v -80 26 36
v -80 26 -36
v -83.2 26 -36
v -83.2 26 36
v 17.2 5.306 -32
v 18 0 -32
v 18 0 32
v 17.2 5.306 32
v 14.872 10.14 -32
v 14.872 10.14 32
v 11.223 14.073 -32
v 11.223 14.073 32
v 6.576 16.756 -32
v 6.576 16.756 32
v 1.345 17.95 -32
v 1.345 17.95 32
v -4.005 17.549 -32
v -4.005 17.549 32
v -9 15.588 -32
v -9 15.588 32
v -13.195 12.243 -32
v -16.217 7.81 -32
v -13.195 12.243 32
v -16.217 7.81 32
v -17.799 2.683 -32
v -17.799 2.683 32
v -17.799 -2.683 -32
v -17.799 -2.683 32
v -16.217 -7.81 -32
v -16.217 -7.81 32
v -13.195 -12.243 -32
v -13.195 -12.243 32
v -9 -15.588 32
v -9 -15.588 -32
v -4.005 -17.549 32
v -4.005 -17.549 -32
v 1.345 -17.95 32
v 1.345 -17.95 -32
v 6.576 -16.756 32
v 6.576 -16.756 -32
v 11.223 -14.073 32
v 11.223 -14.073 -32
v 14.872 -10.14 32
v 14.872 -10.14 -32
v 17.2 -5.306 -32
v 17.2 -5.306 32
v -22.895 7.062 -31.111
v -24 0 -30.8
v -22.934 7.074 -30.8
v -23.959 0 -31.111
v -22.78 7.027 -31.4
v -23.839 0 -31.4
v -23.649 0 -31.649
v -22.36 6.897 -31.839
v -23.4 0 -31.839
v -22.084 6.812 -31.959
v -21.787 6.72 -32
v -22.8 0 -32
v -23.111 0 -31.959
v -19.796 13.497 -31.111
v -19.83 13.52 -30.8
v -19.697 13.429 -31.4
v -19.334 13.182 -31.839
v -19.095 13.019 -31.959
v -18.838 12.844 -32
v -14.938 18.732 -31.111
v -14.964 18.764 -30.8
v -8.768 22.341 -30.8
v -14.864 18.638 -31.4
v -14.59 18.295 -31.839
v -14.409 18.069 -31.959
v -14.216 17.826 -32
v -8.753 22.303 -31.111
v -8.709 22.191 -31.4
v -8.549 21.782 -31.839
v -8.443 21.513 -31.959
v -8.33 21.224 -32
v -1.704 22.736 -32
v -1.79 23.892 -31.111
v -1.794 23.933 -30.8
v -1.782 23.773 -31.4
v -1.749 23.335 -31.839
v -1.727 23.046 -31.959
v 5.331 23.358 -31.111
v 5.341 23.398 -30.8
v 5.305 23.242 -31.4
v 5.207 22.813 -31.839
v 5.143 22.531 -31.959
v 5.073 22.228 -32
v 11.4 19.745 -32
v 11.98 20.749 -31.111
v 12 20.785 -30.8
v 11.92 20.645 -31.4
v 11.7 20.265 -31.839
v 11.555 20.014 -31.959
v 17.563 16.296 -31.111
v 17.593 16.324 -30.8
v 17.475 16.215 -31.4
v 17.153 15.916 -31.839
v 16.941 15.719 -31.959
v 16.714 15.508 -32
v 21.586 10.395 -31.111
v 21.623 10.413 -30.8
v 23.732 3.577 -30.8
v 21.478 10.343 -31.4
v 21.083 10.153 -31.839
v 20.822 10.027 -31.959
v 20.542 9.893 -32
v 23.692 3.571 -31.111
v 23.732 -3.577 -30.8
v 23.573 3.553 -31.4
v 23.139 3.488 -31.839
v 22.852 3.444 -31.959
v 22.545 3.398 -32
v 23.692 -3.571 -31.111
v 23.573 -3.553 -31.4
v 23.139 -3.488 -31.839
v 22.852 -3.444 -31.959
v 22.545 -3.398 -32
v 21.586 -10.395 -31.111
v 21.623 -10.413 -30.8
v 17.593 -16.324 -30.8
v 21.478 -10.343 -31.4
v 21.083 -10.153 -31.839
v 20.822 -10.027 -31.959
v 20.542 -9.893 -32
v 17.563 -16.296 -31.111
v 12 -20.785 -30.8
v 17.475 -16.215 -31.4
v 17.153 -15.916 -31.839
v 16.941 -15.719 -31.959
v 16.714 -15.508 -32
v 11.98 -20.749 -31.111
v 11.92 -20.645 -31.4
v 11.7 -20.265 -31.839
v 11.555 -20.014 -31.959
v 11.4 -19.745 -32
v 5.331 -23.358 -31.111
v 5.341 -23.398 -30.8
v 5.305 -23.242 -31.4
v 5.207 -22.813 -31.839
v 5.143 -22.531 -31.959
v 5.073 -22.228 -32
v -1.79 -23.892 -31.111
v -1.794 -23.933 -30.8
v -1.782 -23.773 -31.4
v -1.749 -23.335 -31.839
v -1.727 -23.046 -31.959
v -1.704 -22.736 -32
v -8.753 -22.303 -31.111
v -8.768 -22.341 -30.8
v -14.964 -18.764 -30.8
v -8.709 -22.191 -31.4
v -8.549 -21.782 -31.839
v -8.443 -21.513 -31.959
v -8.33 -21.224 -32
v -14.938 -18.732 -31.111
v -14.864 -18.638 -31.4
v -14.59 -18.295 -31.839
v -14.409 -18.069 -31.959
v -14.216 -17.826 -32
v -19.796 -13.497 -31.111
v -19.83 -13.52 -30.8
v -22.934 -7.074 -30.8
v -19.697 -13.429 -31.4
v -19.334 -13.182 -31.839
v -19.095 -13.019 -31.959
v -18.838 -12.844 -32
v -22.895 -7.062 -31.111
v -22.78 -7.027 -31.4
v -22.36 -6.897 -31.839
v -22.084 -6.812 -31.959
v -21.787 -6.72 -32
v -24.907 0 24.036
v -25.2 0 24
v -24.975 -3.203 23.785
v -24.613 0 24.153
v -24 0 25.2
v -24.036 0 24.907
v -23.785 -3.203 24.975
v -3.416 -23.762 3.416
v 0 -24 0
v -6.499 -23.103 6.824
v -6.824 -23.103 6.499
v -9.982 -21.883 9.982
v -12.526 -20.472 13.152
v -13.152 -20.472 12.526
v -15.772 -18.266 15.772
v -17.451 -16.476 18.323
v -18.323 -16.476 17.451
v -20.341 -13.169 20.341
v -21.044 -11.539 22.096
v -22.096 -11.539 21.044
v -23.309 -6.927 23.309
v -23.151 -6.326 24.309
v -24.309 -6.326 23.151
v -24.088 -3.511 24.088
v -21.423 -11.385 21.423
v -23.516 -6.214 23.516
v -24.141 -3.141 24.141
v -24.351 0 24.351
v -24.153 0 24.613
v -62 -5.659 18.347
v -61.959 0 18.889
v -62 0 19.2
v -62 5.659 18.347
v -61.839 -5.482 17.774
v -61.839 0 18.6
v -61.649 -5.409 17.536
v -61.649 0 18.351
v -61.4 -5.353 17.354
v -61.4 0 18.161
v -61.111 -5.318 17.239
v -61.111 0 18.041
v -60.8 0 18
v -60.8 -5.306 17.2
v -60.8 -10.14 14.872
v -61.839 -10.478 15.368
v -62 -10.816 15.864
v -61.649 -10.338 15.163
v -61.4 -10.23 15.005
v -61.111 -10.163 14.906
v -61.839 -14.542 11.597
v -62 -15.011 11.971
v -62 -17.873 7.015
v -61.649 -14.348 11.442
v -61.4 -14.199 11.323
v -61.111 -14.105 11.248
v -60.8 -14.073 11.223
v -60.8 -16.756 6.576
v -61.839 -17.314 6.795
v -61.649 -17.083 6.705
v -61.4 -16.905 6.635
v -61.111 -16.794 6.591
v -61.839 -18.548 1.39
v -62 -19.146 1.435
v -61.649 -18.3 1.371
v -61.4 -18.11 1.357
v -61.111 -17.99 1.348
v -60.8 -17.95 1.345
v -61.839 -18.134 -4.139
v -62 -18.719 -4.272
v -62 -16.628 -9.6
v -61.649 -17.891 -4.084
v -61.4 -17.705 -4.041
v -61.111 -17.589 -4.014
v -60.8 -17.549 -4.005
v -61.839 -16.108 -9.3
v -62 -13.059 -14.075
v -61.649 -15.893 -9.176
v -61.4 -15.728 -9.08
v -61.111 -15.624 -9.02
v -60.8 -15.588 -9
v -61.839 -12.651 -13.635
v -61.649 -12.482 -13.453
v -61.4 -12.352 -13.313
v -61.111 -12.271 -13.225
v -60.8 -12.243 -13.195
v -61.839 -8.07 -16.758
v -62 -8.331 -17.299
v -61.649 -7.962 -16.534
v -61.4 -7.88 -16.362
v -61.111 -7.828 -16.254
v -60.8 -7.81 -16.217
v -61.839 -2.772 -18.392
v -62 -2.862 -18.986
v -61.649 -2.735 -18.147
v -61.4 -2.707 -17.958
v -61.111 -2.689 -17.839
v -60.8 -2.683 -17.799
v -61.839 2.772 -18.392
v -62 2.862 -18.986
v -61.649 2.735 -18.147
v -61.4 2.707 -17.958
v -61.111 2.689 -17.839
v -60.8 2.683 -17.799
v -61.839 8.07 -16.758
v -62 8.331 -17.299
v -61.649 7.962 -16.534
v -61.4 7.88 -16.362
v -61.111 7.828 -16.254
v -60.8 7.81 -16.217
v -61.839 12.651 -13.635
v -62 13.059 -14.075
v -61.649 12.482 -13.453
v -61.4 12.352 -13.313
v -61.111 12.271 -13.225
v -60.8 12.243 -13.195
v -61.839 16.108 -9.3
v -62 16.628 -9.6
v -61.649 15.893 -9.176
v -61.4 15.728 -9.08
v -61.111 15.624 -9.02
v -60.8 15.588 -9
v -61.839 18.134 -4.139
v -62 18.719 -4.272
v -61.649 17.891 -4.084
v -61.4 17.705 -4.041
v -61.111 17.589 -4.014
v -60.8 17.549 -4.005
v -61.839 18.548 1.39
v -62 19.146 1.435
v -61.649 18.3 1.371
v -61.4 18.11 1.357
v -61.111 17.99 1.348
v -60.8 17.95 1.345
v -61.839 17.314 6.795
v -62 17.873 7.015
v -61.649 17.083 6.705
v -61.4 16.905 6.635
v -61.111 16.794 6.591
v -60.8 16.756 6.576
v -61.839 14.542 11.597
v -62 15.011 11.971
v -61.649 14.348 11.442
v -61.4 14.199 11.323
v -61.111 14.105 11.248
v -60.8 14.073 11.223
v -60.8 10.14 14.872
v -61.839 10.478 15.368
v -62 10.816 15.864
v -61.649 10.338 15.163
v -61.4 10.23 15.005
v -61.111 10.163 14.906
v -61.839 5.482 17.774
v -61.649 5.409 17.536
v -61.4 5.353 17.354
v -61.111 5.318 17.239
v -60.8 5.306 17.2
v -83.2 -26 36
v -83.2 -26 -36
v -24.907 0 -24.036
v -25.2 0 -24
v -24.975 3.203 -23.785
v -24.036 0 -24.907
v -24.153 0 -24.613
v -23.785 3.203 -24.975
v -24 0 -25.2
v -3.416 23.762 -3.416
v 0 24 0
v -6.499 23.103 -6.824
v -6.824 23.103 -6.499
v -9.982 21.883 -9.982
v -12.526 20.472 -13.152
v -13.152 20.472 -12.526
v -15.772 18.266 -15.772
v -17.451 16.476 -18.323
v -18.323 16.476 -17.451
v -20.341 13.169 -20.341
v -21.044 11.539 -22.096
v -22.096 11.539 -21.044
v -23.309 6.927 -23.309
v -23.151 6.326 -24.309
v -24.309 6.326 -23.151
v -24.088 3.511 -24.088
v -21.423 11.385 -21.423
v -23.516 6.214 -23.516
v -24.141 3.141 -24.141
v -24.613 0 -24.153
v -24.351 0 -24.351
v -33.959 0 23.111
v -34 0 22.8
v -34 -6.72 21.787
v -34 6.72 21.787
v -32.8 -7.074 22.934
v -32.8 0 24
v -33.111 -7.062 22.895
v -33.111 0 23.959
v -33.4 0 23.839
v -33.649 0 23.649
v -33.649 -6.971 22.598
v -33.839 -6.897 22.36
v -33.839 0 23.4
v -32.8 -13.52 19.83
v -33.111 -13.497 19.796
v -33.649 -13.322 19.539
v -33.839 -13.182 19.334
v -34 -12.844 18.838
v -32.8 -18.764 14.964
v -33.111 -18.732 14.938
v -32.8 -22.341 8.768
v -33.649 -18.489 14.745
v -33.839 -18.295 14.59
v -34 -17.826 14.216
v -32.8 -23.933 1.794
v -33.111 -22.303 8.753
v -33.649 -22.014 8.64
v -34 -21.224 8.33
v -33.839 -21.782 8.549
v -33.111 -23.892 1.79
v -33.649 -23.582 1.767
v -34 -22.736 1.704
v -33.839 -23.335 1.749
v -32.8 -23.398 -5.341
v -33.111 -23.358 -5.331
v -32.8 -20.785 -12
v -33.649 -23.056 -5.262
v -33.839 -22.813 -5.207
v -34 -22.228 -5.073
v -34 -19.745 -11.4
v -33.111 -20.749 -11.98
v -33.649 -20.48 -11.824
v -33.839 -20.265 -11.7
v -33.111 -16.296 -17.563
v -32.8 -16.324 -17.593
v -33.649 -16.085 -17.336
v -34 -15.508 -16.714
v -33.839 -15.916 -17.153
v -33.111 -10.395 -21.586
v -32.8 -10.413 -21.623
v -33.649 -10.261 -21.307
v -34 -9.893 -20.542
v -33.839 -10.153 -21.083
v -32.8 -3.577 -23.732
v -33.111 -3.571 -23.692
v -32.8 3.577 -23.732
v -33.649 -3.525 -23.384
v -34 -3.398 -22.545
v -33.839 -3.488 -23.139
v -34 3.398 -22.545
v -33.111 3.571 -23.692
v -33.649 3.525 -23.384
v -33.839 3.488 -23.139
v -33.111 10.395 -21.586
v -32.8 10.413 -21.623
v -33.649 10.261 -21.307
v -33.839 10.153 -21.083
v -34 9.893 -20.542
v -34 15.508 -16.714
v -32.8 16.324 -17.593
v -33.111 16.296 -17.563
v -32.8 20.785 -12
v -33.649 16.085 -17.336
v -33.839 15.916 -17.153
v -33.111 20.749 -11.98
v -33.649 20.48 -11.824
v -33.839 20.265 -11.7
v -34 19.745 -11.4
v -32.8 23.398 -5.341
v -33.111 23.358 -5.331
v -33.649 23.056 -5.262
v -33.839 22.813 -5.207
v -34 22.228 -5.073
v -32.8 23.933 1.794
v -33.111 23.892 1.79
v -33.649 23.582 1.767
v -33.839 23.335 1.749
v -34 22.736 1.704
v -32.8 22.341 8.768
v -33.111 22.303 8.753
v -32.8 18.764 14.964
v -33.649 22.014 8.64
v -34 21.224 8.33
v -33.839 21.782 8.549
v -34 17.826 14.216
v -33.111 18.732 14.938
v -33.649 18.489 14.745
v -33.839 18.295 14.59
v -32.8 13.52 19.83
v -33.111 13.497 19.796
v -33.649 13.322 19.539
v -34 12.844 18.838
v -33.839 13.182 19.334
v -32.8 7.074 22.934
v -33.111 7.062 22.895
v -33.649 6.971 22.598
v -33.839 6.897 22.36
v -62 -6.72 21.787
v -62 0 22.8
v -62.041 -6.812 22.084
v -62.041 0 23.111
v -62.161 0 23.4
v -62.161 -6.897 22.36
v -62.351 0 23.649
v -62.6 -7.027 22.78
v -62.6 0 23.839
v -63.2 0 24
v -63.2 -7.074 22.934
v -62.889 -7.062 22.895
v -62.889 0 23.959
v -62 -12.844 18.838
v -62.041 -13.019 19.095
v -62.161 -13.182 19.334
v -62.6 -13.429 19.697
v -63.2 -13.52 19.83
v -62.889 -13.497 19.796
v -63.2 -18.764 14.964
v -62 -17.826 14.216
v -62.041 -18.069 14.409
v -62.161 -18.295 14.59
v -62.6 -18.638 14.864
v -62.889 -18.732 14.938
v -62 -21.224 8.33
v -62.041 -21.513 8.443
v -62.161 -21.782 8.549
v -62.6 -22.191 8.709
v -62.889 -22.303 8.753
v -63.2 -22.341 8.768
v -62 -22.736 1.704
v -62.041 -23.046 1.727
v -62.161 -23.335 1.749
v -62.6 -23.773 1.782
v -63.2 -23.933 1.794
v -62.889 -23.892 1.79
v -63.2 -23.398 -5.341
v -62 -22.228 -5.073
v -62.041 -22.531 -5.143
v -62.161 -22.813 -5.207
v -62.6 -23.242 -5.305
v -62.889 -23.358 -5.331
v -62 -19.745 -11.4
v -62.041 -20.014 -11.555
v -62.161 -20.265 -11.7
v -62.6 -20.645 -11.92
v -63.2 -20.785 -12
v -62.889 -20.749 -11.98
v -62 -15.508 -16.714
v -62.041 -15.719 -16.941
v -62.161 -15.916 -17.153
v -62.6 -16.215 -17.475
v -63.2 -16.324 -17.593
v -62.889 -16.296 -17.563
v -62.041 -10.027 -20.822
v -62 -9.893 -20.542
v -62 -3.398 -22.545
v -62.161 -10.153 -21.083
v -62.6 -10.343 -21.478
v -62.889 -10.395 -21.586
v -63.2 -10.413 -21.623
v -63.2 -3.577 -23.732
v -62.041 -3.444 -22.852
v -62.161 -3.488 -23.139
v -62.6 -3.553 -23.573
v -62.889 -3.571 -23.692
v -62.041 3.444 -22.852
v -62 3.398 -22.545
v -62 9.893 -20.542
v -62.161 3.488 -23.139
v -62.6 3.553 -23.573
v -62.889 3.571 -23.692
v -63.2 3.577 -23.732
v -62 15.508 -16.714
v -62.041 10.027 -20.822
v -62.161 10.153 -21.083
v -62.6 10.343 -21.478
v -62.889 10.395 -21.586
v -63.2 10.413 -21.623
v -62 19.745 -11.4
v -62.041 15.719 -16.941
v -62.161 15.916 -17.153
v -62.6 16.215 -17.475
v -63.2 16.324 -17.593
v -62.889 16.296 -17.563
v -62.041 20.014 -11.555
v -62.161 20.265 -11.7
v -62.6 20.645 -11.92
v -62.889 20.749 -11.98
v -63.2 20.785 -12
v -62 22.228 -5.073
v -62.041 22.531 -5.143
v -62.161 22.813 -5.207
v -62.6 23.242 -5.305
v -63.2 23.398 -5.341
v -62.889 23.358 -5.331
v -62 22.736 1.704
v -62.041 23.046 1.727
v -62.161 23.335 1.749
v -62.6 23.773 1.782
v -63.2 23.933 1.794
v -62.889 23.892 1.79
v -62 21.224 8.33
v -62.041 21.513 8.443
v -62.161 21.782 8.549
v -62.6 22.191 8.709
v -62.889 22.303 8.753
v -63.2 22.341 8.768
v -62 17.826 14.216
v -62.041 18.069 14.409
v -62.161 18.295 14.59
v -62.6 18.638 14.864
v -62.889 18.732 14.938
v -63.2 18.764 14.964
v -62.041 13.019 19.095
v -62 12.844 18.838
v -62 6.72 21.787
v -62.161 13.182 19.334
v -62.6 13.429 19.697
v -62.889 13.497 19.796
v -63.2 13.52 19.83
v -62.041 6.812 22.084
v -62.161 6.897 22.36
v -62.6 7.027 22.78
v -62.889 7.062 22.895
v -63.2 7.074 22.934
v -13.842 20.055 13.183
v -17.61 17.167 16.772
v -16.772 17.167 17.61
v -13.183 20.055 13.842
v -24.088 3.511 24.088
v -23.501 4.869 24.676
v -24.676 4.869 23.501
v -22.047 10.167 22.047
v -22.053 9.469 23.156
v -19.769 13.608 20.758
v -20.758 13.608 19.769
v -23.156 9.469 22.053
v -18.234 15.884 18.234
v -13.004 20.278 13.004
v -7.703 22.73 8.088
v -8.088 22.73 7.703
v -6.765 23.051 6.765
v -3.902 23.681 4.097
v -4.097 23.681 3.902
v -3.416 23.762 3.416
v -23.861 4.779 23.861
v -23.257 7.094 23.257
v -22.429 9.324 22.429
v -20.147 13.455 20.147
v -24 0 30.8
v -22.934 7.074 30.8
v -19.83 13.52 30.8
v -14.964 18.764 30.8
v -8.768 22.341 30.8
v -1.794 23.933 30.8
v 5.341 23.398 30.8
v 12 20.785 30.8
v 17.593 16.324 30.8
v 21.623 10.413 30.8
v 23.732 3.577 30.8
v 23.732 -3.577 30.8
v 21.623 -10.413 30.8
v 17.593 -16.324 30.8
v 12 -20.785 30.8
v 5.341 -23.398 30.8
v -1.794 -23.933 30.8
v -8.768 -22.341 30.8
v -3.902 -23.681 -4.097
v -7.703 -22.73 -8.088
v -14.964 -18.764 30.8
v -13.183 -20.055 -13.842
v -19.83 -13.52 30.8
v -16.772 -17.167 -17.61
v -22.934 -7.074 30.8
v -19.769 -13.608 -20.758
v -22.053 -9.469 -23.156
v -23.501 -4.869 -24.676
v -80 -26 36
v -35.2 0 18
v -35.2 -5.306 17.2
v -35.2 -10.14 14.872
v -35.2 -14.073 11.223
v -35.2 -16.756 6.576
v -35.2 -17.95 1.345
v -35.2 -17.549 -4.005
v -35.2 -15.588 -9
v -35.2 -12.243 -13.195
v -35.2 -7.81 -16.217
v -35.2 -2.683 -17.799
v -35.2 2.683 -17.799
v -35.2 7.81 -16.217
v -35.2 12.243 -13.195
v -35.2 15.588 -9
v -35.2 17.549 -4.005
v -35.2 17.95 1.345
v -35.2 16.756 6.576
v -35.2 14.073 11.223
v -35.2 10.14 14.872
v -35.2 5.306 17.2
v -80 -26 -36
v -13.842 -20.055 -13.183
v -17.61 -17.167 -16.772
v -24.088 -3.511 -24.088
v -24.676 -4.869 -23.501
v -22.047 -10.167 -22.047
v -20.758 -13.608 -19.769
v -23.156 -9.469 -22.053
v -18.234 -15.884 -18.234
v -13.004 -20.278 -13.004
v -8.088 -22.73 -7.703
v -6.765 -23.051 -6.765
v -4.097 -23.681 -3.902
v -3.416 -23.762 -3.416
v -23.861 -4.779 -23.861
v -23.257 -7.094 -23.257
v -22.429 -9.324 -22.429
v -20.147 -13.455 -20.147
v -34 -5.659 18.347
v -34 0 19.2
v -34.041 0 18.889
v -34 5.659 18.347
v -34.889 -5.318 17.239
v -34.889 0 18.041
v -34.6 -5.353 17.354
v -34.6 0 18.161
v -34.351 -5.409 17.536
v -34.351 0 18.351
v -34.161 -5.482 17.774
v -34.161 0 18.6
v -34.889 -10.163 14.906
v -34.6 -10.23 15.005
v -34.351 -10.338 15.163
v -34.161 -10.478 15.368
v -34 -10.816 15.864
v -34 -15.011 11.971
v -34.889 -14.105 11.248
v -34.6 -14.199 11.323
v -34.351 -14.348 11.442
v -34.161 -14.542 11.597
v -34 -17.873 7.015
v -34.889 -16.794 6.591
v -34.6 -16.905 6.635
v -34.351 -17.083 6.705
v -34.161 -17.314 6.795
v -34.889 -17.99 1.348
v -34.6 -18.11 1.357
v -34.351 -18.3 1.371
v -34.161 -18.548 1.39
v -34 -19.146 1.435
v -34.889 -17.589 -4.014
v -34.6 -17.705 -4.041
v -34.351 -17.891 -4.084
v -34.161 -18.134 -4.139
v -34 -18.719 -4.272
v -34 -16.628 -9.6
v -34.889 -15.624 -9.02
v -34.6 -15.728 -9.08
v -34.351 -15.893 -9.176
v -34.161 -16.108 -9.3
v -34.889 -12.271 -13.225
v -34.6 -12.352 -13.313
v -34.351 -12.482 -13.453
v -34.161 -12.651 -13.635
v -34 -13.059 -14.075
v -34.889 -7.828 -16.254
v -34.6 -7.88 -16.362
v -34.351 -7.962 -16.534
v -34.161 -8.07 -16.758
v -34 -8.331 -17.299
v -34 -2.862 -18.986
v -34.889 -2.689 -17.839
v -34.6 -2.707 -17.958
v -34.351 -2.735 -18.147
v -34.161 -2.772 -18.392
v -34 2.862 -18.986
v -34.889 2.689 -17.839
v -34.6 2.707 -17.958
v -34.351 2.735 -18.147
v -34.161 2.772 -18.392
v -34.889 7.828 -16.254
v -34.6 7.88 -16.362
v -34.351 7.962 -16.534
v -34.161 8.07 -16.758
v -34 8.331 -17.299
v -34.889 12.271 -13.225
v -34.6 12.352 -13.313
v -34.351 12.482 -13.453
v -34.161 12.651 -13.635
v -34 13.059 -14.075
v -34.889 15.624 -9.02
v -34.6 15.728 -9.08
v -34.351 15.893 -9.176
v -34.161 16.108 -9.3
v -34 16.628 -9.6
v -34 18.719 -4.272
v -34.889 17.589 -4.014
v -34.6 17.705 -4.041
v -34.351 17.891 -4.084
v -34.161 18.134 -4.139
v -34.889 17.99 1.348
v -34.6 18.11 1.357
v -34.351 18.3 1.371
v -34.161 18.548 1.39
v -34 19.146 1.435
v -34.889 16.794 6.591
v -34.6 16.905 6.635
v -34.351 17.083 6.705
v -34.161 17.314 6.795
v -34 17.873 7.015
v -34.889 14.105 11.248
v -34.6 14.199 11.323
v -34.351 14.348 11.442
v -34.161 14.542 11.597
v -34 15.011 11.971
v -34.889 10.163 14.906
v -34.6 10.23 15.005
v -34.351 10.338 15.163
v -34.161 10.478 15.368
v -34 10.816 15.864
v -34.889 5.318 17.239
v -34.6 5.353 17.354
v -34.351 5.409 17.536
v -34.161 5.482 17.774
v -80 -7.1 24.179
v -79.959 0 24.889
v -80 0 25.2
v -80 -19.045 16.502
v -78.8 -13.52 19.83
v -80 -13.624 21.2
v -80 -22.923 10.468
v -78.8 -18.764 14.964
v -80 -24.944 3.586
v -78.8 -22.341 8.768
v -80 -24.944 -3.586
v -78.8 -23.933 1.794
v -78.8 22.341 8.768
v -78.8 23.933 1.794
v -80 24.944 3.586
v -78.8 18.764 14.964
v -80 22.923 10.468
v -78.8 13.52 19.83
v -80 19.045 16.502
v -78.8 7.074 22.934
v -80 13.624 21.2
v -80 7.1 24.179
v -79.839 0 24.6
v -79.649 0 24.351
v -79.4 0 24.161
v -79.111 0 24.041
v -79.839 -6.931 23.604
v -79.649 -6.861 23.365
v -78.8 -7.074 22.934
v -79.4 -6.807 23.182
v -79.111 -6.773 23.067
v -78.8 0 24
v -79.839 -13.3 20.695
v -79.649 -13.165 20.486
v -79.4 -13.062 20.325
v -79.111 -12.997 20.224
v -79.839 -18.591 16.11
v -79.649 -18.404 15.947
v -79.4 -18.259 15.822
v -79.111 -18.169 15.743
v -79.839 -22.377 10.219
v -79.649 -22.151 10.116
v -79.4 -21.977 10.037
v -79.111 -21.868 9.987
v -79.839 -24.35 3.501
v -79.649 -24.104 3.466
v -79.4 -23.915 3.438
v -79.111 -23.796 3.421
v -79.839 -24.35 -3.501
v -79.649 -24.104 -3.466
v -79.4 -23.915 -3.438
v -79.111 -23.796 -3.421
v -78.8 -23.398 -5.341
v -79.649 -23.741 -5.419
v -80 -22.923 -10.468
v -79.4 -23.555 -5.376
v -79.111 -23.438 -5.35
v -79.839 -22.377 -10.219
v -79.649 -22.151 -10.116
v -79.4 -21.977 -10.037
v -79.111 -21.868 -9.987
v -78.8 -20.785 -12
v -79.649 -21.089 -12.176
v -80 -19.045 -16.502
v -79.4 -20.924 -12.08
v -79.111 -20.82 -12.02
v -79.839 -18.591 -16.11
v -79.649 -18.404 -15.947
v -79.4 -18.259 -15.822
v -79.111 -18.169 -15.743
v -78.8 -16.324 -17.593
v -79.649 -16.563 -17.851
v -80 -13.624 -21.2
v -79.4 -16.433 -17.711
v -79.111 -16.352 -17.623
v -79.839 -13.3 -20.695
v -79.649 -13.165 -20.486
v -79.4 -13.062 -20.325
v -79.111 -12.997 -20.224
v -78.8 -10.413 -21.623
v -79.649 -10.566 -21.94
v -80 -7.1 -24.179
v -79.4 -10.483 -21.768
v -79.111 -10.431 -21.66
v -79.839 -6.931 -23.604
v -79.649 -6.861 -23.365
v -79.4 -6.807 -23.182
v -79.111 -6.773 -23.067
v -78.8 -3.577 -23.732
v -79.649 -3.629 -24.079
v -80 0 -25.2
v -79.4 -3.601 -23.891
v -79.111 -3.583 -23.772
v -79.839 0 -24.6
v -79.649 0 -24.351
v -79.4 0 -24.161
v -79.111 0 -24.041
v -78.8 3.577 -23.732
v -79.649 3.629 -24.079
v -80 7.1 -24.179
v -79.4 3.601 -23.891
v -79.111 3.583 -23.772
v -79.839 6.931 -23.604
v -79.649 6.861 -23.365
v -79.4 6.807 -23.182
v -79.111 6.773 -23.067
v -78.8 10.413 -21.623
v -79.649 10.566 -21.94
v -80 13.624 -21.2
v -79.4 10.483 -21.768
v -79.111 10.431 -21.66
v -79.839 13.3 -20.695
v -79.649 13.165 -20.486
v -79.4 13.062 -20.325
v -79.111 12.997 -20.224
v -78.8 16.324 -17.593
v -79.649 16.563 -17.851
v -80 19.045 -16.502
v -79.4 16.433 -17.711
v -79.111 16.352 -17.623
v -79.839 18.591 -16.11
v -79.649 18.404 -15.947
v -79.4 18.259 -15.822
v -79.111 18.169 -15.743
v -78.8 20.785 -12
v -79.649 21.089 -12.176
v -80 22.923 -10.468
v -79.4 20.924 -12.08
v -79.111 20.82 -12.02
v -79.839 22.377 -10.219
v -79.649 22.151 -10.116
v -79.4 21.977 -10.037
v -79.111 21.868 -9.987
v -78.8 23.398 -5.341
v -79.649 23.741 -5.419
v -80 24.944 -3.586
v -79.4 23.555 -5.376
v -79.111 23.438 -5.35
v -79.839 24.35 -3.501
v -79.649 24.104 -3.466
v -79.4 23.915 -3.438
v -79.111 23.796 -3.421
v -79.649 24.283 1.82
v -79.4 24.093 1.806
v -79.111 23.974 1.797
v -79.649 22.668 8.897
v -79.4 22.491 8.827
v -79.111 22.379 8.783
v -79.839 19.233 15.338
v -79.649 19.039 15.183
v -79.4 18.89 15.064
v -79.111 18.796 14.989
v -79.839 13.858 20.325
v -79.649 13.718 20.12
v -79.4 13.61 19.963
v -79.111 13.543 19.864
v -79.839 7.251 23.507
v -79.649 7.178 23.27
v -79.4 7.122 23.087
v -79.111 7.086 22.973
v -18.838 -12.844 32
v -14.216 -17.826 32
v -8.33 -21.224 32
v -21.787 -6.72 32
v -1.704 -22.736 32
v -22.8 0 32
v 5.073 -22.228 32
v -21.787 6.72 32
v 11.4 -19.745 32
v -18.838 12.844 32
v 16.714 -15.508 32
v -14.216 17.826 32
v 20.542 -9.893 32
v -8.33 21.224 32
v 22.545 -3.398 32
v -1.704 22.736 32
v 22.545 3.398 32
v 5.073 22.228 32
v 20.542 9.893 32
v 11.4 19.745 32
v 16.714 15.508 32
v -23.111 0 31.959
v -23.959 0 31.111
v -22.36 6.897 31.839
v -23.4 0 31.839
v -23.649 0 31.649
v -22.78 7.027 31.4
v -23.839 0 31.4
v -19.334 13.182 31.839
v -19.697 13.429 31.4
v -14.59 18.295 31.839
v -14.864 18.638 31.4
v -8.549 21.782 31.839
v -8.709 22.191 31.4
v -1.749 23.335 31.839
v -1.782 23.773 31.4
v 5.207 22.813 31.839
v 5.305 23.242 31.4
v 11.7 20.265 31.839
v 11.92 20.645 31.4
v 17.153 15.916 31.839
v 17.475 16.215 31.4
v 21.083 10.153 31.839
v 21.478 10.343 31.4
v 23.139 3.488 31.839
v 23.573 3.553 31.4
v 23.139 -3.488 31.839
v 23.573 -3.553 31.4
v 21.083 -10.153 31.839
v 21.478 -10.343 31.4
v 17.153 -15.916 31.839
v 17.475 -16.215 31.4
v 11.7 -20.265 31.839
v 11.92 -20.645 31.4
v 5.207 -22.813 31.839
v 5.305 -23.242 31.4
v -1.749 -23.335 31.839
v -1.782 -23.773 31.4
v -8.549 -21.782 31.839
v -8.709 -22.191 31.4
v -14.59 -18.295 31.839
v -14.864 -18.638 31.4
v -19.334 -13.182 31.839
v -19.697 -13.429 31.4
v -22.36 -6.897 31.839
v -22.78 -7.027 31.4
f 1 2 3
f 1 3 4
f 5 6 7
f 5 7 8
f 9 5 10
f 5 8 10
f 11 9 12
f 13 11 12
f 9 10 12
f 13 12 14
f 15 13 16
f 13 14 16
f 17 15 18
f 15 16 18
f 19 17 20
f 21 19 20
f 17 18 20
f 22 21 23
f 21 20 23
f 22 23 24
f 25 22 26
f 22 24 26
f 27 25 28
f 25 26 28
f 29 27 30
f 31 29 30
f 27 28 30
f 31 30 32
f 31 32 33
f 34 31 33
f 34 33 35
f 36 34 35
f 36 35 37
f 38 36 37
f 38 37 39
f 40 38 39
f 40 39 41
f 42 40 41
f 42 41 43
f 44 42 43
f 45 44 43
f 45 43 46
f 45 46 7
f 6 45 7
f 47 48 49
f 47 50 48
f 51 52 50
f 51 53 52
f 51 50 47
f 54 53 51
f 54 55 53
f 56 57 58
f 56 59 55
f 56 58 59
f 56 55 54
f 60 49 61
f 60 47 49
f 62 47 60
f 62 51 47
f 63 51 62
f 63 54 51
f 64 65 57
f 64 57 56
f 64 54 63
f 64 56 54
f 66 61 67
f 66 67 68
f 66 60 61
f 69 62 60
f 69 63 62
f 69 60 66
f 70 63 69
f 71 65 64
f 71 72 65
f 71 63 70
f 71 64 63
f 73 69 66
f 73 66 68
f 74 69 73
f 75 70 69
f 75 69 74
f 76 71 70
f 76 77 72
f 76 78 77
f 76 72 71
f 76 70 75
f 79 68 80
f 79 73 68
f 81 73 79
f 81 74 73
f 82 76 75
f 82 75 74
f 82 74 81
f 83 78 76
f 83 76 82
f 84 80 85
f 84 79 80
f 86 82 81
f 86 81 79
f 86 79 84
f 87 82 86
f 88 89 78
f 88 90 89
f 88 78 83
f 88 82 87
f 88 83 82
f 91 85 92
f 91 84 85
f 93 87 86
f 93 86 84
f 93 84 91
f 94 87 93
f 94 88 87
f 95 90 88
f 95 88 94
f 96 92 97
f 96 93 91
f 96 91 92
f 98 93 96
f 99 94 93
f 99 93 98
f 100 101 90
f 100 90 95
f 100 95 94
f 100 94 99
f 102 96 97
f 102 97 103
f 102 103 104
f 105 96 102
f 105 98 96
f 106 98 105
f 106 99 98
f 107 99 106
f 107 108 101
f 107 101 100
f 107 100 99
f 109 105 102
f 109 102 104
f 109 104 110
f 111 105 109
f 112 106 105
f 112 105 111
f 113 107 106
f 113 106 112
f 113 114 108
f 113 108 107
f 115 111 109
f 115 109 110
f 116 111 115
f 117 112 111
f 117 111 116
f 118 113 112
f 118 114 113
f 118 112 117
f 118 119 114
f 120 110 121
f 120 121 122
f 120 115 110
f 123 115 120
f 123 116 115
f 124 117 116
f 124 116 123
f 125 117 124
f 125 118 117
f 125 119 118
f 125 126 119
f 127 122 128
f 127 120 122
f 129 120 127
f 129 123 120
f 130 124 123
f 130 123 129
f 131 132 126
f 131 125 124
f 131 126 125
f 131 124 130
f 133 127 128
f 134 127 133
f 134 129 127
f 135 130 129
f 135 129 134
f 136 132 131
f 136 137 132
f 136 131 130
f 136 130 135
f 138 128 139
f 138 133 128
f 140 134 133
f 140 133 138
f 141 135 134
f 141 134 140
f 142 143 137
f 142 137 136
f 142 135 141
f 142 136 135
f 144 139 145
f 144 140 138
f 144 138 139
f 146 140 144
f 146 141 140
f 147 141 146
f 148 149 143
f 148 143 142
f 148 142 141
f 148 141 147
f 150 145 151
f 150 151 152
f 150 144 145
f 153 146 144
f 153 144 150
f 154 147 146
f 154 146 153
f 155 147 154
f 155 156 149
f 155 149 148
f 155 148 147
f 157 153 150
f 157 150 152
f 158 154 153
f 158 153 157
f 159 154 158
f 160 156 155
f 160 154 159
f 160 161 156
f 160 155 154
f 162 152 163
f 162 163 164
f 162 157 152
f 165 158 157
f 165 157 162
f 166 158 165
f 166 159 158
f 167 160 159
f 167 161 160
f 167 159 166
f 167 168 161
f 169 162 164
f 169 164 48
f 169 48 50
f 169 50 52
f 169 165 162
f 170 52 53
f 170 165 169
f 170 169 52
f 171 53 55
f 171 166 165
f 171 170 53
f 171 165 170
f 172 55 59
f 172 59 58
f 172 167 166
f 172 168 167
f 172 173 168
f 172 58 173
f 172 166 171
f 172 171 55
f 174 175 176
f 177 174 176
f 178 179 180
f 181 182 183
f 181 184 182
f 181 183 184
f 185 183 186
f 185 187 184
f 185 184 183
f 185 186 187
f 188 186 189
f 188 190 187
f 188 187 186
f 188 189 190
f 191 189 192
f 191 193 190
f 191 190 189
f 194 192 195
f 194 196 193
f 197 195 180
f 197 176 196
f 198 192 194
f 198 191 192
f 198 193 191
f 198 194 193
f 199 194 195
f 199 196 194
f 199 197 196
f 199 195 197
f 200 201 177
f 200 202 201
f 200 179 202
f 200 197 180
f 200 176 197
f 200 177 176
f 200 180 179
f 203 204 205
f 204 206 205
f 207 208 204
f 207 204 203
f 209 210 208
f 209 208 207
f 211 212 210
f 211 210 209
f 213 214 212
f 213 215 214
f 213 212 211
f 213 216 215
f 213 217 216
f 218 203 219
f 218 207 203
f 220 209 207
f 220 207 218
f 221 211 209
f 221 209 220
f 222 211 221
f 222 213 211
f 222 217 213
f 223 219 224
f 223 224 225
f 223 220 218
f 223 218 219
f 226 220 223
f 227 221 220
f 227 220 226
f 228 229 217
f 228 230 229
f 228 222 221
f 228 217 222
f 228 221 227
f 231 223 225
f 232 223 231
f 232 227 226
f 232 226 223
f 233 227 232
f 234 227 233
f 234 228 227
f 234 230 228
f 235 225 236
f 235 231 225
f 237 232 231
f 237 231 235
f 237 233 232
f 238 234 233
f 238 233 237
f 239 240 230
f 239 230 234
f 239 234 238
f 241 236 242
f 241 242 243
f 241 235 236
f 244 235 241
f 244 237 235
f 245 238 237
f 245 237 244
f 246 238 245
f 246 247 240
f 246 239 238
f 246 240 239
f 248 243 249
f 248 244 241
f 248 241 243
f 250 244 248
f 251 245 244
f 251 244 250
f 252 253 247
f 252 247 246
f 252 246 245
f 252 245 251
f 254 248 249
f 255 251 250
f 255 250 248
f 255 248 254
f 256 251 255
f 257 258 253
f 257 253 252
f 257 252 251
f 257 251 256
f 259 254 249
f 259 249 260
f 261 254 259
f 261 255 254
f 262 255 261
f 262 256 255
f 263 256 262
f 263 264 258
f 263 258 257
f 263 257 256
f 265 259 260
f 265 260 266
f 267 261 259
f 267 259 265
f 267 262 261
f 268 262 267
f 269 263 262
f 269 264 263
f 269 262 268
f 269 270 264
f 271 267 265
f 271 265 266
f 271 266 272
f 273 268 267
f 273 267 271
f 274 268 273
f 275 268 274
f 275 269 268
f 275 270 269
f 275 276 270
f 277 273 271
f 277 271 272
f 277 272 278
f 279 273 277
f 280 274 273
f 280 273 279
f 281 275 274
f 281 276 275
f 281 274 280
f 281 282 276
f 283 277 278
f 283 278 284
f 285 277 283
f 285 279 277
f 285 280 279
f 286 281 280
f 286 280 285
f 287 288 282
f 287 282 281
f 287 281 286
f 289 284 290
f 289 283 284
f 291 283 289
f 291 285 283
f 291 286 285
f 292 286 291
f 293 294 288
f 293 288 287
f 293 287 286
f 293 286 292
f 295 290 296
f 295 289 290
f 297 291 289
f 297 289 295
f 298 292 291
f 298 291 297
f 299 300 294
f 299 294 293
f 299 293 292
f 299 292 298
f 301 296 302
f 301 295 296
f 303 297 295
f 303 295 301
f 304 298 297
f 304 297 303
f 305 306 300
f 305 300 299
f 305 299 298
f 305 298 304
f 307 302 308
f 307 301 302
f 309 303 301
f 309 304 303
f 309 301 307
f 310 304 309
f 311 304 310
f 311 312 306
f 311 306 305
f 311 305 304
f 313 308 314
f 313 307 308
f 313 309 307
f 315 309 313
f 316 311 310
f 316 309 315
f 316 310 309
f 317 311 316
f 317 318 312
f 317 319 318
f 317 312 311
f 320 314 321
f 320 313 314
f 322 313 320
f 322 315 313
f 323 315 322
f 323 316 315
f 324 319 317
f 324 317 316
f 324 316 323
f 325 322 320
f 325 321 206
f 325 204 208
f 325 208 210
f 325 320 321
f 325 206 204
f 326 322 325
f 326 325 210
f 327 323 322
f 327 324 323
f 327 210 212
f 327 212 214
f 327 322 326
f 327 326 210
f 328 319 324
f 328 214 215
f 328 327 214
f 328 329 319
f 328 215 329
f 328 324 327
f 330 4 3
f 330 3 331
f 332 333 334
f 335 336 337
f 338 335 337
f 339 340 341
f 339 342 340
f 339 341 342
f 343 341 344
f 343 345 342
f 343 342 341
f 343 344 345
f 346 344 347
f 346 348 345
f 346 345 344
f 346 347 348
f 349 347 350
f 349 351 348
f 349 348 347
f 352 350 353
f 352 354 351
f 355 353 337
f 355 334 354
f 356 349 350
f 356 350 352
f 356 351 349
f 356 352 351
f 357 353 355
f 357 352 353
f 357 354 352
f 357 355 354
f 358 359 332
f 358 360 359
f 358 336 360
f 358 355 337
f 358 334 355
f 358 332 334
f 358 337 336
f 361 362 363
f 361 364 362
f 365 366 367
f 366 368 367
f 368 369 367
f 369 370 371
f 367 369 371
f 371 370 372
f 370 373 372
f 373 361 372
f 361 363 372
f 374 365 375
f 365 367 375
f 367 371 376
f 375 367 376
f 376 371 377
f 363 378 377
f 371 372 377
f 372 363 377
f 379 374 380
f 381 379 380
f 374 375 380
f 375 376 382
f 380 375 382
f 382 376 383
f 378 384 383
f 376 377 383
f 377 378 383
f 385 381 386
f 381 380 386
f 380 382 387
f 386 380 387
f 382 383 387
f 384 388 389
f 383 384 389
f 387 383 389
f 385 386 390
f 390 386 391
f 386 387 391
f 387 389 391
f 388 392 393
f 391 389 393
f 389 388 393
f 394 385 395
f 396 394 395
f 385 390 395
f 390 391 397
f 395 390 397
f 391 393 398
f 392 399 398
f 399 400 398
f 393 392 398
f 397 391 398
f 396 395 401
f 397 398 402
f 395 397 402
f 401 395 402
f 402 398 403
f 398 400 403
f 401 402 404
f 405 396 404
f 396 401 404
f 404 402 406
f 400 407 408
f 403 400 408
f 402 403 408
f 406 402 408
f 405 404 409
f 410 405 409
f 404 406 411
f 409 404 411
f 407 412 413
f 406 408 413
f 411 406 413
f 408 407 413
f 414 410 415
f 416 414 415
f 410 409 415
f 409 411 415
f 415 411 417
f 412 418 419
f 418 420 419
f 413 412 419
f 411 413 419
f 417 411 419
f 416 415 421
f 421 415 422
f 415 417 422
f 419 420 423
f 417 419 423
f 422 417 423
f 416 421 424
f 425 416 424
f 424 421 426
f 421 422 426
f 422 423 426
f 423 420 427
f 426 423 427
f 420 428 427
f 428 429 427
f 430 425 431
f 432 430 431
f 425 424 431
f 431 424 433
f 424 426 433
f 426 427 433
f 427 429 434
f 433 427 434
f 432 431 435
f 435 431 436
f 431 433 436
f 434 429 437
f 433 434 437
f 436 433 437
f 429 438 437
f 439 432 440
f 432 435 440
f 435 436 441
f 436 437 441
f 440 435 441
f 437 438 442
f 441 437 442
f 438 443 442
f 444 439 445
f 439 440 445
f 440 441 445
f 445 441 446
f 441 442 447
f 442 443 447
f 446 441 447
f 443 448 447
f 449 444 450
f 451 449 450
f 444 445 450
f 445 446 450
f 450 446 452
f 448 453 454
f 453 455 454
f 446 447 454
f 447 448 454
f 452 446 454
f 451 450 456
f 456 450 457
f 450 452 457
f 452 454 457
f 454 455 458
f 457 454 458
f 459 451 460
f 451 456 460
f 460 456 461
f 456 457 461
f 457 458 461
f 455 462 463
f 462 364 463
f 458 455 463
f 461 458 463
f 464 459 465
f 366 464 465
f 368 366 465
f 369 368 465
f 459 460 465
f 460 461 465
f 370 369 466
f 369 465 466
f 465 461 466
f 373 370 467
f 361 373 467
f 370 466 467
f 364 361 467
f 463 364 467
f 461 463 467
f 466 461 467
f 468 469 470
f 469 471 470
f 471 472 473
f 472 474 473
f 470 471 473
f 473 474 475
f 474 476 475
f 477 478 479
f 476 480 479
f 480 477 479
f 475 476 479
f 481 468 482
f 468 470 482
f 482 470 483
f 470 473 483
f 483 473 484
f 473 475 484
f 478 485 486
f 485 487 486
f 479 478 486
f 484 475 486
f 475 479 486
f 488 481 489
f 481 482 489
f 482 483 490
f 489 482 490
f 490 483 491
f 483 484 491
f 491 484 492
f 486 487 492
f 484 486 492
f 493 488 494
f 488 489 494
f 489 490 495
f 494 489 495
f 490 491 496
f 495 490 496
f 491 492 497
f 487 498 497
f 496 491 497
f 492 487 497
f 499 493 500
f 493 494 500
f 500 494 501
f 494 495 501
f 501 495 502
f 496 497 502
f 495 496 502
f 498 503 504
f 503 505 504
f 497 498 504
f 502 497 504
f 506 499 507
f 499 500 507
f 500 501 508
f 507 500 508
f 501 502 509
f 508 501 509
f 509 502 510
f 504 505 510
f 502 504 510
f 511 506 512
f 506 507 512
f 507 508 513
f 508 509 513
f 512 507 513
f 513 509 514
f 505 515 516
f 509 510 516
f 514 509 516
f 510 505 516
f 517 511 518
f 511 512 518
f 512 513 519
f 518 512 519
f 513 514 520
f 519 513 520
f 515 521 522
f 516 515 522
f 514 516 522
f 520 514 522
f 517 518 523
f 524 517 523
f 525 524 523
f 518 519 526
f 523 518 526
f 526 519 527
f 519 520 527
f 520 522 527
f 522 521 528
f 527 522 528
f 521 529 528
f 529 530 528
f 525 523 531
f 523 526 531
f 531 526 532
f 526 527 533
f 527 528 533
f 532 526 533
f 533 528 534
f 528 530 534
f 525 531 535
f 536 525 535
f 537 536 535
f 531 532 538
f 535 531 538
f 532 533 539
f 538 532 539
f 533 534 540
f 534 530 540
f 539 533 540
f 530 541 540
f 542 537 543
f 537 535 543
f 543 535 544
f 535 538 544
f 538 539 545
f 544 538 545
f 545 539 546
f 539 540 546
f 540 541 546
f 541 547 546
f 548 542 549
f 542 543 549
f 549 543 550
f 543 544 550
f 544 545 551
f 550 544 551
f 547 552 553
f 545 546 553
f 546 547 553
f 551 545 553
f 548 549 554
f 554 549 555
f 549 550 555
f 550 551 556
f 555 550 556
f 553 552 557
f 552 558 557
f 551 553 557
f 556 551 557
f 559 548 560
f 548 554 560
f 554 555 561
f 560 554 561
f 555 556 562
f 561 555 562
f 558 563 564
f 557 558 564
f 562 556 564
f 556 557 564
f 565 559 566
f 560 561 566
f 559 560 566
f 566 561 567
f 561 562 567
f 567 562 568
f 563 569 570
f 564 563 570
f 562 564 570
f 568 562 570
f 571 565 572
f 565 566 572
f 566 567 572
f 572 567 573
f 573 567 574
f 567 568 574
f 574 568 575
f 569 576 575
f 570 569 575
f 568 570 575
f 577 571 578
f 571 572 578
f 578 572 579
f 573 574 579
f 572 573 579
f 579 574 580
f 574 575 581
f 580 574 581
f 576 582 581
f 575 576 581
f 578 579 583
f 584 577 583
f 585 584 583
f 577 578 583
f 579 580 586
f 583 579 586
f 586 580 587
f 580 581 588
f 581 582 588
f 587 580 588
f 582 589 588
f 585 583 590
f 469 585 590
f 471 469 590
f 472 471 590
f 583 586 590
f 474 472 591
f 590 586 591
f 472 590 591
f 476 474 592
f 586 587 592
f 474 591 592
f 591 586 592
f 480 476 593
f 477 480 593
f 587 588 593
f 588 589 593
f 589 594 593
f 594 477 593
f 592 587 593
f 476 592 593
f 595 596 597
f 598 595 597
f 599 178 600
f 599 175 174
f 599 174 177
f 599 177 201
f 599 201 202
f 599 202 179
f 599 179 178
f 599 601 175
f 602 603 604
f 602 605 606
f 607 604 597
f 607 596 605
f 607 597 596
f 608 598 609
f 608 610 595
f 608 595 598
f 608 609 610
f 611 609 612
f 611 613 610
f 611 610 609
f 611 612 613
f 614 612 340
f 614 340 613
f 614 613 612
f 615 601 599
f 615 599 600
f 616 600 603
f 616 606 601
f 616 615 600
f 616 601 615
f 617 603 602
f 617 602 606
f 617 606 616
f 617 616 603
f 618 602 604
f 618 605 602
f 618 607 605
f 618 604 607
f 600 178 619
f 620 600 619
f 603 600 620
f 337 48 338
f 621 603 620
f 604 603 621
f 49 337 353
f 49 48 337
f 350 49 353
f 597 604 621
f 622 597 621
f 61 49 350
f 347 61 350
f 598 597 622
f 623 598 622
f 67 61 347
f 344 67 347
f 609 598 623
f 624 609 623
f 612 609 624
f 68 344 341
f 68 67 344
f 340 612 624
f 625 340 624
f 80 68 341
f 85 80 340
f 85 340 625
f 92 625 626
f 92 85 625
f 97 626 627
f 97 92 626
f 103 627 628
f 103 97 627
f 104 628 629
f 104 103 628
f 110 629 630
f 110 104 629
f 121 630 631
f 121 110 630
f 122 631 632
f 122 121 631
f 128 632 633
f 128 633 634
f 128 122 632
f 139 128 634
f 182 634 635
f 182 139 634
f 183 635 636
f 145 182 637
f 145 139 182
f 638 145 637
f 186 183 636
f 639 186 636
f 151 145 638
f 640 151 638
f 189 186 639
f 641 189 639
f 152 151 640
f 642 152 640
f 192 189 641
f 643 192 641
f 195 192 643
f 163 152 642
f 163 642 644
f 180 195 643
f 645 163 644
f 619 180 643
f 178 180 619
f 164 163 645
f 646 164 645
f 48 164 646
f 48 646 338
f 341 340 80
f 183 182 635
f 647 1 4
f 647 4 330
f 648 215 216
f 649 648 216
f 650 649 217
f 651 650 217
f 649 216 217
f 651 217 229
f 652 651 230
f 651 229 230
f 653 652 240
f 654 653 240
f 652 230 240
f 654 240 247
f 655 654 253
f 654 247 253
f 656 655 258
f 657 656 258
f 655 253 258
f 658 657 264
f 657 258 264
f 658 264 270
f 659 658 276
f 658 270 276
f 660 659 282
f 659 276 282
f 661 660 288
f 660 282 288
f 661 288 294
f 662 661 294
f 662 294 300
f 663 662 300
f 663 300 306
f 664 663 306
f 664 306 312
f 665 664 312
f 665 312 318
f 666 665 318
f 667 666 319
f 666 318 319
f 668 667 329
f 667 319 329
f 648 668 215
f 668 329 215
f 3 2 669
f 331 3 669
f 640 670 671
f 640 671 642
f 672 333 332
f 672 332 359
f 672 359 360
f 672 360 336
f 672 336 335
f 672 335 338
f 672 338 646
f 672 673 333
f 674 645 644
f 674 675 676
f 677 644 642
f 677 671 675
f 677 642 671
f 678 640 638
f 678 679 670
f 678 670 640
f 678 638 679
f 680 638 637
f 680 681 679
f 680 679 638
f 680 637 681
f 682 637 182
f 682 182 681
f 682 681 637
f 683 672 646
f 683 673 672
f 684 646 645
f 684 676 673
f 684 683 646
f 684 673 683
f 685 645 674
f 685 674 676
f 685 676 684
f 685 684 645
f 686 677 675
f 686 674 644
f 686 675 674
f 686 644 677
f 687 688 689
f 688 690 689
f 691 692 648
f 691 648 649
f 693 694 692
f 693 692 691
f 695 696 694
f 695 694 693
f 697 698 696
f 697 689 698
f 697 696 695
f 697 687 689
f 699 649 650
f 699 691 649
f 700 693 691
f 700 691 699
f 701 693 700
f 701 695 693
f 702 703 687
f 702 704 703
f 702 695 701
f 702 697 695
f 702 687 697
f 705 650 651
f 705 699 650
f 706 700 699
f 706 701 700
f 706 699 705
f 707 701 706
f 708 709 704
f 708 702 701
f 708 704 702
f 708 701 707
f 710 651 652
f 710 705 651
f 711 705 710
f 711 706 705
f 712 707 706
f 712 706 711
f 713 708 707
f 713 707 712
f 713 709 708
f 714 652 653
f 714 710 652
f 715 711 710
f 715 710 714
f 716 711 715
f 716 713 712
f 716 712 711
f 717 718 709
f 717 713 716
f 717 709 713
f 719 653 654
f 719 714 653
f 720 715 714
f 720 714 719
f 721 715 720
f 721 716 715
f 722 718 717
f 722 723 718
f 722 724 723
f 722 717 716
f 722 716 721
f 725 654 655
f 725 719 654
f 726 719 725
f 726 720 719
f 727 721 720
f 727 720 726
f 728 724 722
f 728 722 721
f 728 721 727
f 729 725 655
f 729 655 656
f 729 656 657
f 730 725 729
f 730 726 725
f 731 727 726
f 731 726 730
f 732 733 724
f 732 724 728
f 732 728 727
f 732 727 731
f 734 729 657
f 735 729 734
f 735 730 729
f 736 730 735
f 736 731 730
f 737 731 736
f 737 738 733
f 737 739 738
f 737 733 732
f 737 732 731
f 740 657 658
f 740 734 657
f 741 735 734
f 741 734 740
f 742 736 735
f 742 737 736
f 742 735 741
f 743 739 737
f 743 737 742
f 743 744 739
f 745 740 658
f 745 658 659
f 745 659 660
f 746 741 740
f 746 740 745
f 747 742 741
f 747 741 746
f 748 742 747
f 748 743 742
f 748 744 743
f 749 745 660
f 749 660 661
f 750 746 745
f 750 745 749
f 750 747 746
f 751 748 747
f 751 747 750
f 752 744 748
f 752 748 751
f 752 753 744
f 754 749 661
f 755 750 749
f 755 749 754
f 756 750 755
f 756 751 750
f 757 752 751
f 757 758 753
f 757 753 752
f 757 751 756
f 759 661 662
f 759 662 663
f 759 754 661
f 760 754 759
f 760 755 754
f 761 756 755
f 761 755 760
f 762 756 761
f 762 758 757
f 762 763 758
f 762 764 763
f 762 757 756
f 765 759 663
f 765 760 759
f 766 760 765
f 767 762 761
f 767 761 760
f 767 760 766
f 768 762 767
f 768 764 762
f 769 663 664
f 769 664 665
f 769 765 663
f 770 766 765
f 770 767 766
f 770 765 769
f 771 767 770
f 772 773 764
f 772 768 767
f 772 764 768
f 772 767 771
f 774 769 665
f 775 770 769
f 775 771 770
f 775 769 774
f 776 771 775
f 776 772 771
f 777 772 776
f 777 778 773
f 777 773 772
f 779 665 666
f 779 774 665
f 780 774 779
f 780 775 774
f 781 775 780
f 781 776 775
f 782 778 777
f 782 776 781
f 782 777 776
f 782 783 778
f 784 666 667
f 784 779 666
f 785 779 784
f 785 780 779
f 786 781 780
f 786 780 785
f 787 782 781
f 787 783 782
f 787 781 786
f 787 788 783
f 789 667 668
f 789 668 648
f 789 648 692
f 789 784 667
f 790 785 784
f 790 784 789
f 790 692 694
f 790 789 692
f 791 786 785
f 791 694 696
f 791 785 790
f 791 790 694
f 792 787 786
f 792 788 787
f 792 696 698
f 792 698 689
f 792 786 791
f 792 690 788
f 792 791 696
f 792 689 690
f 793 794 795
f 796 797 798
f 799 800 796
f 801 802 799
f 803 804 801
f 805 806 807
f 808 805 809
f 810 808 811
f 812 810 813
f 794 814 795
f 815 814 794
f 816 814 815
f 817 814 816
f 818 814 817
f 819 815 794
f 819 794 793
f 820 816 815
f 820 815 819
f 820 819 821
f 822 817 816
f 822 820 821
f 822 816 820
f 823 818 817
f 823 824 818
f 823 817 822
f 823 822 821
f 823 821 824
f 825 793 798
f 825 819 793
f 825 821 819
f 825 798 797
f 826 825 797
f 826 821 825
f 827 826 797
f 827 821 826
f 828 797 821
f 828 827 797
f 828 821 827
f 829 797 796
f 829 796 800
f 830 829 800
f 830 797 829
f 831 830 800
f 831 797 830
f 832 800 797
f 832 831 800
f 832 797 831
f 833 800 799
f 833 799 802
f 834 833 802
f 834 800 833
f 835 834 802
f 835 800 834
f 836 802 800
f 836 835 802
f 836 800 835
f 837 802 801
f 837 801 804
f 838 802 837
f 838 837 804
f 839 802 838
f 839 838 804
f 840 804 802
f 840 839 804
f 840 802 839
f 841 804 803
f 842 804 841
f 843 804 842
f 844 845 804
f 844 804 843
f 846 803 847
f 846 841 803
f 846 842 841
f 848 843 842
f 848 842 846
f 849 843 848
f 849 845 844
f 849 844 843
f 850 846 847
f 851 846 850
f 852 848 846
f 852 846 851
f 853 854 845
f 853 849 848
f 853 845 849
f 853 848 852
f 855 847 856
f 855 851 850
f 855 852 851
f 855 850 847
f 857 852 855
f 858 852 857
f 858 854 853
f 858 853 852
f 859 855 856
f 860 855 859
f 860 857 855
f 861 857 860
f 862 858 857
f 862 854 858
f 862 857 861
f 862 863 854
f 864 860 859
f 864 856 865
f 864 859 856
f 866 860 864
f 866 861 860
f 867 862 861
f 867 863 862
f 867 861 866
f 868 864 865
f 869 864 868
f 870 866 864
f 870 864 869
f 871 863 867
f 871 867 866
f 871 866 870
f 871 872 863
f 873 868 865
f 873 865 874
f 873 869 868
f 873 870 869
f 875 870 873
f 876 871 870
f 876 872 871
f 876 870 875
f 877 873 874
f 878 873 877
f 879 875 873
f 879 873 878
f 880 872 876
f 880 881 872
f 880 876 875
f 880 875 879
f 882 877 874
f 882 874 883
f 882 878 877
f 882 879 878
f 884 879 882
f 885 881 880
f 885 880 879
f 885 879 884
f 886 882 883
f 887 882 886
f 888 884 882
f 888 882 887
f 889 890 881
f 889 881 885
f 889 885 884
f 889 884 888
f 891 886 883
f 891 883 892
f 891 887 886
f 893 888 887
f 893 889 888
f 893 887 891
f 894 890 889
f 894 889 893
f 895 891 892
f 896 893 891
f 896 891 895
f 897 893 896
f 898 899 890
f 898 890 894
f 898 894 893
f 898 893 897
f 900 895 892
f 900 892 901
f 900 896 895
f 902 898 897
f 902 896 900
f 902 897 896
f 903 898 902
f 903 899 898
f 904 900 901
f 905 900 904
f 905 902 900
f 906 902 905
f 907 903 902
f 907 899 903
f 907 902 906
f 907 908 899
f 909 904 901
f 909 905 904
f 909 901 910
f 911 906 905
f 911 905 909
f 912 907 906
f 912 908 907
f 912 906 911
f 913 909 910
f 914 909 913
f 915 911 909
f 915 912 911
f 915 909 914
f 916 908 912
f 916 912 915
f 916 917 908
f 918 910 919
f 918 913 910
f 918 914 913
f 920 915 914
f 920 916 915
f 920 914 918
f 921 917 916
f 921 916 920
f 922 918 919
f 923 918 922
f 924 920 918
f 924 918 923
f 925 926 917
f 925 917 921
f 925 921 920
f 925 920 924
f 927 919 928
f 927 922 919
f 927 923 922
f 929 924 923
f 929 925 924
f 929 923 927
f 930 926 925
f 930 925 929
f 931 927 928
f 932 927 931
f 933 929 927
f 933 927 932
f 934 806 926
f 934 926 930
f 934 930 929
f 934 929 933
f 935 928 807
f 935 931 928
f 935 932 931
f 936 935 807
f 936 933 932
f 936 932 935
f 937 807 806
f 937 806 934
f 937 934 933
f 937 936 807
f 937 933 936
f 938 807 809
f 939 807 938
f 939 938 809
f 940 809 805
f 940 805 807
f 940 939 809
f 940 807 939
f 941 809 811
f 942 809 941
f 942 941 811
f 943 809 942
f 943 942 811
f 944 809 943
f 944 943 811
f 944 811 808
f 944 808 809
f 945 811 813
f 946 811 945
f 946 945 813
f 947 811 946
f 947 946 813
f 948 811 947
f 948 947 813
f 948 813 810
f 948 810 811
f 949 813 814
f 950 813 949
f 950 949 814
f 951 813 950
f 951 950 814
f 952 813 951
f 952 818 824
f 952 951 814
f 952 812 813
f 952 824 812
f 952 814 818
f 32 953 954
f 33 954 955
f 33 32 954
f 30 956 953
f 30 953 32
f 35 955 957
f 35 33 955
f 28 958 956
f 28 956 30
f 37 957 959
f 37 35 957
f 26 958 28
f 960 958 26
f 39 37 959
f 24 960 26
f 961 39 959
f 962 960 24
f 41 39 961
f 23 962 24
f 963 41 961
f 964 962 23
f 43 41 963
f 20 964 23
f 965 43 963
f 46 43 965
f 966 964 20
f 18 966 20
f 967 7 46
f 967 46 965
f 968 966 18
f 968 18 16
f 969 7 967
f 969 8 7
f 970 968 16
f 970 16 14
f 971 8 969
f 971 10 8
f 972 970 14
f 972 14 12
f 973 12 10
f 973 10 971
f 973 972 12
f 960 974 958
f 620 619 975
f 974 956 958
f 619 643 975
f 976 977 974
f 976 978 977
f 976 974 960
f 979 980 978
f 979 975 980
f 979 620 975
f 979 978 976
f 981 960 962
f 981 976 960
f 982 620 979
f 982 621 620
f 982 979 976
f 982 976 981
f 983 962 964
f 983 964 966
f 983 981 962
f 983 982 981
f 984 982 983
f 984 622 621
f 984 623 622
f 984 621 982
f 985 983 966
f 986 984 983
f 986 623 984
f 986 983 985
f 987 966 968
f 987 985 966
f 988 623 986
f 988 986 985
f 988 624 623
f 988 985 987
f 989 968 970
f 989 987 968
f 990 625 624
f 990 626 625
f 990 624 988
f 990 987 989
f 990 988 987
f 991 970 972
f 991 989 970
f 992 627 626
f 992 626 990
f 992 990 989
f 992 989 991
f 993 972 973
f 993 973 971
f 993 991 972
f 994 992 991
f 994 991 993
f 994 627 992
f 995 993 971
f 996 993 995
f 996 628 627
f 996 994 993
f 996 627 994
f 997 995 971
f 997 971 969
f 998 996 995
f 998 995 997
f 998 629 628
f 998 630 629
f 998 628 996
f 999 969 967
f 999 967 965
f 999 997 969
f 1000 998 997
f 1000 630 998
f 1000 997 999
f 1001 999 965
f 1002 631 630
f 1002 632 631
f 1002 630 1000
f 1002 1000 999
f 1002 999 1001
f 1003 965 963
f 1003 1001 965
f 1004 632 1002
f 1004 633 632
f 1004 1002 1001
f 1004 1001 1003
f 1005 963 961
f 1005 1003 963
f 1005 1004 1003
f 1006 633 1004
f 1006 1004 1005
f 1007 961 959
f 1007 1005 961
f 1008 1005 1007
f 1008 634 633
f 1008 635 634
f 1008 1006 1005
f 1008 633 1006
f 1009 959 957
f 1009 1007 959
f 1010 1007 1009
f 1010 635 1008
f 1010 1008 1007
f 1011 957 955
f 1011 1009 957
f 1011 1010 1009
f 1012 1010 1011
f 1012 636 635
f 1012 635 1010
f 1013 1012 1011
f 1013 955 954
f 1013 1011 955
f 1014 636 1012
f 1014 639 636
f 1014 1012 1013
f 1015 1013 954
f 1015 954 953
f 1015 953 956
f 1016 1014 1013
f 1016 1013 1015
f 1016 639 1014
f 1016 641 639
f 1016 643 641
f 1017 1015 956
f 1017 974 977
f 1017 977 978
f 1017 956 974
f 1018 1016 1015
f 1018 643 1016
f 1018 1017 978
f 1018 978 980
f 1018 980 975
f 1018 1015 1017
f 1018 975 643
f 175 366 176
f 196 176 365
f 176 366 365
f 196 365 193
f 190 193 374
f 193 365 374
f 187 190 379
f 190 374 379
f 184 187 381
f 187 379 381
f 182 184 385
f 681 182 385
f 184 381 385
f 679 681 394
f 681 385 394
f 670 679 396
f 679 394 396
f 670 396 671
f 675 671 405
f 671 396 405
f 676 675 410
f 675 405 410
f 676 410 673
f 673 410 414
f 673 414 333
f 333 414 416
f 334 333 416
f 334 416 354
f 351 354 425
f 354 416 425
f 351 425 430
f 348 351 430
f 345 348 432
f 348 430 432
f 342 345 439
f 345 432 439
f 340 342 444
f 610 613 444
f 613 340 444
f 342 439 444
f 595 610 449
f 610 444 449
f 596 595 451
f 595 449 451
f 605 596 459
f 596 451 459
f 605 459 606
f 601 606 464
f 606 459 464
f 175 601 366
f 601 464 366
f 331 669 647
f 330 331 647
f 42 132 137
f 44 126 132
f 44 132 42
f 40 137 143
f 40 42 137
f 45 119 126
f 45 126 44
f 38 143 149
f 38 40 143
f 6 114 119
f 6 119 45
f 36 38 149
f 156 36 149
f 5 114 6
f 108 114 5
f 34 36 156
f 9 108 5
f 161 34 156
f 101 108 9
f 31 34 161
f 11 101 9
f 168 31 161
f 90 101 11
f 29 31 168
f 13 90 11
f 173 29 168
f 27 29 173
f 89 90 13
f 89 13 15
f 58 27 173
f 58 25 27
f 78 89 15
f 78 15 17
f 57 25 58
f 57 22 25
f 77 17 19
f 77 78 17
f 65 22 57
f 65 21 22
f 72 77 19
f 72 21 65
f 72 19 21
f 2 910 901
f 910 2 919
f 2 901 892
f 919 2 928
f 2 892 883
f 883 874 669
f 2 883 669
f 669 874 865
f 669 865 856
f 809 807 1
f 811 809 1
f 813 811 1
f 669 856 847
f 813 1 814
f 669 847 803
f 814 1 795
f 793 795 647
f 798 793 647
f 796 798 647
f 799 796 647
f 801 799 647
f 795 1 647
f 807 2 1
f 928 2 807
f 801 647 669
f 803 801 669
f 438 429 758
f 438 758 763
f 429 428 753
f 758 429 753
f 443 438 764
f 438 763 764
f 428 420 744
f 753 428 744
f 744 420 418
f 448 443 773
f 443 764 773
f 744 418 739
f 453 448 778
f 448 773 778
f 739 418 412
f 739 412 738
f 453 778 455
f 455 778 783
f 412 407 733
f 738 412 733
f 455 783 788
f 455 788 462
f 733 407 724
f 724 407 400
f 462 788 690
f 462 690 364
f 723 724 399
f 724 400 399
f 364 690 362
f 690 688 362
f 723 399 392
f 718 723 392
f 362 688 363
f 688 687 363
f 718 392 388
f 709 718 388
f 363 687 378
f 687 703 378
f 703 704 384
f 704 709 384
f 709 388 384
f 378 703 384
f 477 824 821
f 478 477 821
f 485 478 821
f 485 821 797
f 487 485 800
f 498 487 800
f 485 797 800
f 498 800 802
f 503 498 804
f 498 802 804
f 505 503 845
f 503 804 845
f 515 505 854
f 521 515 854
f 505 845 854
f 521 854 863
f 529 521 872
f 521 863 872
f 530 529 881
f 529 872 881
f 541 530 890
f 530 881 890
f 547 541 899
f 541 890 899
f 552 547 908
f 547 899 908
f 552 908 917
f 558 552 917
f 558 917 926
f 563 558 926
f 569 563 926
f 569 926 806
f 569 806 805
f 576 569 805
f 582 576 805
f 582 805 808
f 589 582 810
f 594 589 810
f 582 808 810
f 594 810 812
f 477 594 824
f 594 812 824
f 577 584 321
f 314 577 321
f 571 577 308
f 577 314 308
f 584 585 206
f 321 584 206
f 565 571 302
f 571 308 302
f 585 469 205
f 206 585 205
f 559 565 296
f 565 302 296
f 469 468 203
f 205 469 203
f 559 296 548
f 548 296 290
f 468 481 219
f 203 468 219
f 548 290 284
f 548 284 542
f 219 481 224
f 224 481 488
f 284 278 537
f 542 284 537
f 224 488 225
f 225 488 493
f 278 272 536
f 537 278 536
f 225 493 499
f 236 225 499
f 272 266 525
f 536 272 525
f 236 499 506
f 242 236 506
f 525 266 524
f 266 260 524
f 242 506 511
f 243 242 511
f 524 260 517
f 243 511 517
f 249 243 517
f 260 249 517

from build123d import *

# Parameters (mm, degrees)
F4_W     = 52
F4_H     = 72
F5_DEPTH = 3.2
F6_F1_R  = 1.2
F6_F2_R  = 1.2
F6_F3_R  = 1.2
F6_F4_R  = 1.2
F6_F5_R  = 1.2
F7_R     = 18
F8_DEPTH = 68.001


with BuildPart() as f1:
    # F0 (on Front) → F1 (revolve)
    with BuildSketch(Plane.XZ):
        with BuildLine():
            Line((-63.2, 24), (-80, 24))
            Line((-80, 24), (-80, 0))
            Line((-80, 0), (0, 0))
            Line((0, 0), (0, 24))
            Line((0, 24), (-32.8, 24))
            ThreePointArc((-32.8, 24), (-33.6485281374, 23.6485281374), (-34, 22.8))
            Line((-34, 22.8), (-34, 18))
            Line((-34, 18), (-62, 18))
            Line((-62, 18), (-62, 22.8))
            ThreePointArc((-62, 22.8), (-62.3514718626, 23.6485281374), (-63.2, 24))
        make_face()
    revolve(axis=Axis((-40, 0, 0), (1, 0, 0)))

    # F2 (on Front) → F3 (revolve)
    with BuildSketch(Plane.XZ):
        with BuildLine():
            Line((0, 32), (-22.8, 32))
            ThreePointArc((-22.8, 32), (-23.6485281374, 31.6485281374), (-24, 30.8))
            Line((-24, 30.8), (-24, -30.8))
            ThreePointArc((-24, -30.8), (-23.6485281374, -31.6485281374), (-22.8, -32))
            Line((-22.8, -32), (0, -32))
            Line((0, -32), (0, 32))
        make_face()
    revolve(axis=Axis((0, 0, 0), (0, 0, -1)))

    # F4 (on face) → F5 (join)
    with BuildSketch(Plane(origin=(-80, 0, 0), x_dir=(0, -1, 0), z_dir=(-1, 0, 0))):
        Rectangle(F4_W, F4_H)
    extrude(amount=F5_DEPTH)

    # F6: fillet of radius 1.2 on 7 edges, made by hand

    # F6_f1
    f6_f1_edges = [f1.edges().sort_by_distance(p)[0] for p in [
        (-80, 0, -24),
    ]]
    fillet(f6_f1_edges, radius=F6_F1_R)

    # F6_f2
    f6_f2_edges = [f1.edges().sort_by_distance(p)[0] for p in [
        (-62, 0, -18),
    ]]
    fillet(f6_f2_edges, radius=F6_F2_R)

    # F6_f3
    f6_f3_edges = [f1.edges().sort_by_distance(p)[0] for p in [
        (-34, 0, -18),
    ]]
    fillet(f6_f3_edges, radius=F6_F3_R)

    # F6_f4
    f6_f4_edges = [f1.edges().sort_by_distance(p)[0] for p in [
        (-16.9705627499, -16.9705627471, 16.9705627499),
        (-16.9705627485, 16.9705627485, 16.9705627485),
    ]]
    fillet(f6_f4_edges, radius=F6_F4_R)

    # F6_f5
    f6_f5_edges = [f1.edges().sort_by_distance(p)[0] for p in [
        (-16.9705627499, 16.9705627471, -16.9705627499),
        (-16.9705627485, -16.9705627485, -16.9705627485),
    ]]
    fillet(f6_f5_edges, radius=F6_F5_R)

    # F7 (on face) → F8 (cut, through all)
    with BuildSketch(Plane.XY.offset(32)):
        Circle(F7_R)
    extrude(amount=-F8_DEPTH, mode=Mode.SUBTRACT)


solid = f1.part
